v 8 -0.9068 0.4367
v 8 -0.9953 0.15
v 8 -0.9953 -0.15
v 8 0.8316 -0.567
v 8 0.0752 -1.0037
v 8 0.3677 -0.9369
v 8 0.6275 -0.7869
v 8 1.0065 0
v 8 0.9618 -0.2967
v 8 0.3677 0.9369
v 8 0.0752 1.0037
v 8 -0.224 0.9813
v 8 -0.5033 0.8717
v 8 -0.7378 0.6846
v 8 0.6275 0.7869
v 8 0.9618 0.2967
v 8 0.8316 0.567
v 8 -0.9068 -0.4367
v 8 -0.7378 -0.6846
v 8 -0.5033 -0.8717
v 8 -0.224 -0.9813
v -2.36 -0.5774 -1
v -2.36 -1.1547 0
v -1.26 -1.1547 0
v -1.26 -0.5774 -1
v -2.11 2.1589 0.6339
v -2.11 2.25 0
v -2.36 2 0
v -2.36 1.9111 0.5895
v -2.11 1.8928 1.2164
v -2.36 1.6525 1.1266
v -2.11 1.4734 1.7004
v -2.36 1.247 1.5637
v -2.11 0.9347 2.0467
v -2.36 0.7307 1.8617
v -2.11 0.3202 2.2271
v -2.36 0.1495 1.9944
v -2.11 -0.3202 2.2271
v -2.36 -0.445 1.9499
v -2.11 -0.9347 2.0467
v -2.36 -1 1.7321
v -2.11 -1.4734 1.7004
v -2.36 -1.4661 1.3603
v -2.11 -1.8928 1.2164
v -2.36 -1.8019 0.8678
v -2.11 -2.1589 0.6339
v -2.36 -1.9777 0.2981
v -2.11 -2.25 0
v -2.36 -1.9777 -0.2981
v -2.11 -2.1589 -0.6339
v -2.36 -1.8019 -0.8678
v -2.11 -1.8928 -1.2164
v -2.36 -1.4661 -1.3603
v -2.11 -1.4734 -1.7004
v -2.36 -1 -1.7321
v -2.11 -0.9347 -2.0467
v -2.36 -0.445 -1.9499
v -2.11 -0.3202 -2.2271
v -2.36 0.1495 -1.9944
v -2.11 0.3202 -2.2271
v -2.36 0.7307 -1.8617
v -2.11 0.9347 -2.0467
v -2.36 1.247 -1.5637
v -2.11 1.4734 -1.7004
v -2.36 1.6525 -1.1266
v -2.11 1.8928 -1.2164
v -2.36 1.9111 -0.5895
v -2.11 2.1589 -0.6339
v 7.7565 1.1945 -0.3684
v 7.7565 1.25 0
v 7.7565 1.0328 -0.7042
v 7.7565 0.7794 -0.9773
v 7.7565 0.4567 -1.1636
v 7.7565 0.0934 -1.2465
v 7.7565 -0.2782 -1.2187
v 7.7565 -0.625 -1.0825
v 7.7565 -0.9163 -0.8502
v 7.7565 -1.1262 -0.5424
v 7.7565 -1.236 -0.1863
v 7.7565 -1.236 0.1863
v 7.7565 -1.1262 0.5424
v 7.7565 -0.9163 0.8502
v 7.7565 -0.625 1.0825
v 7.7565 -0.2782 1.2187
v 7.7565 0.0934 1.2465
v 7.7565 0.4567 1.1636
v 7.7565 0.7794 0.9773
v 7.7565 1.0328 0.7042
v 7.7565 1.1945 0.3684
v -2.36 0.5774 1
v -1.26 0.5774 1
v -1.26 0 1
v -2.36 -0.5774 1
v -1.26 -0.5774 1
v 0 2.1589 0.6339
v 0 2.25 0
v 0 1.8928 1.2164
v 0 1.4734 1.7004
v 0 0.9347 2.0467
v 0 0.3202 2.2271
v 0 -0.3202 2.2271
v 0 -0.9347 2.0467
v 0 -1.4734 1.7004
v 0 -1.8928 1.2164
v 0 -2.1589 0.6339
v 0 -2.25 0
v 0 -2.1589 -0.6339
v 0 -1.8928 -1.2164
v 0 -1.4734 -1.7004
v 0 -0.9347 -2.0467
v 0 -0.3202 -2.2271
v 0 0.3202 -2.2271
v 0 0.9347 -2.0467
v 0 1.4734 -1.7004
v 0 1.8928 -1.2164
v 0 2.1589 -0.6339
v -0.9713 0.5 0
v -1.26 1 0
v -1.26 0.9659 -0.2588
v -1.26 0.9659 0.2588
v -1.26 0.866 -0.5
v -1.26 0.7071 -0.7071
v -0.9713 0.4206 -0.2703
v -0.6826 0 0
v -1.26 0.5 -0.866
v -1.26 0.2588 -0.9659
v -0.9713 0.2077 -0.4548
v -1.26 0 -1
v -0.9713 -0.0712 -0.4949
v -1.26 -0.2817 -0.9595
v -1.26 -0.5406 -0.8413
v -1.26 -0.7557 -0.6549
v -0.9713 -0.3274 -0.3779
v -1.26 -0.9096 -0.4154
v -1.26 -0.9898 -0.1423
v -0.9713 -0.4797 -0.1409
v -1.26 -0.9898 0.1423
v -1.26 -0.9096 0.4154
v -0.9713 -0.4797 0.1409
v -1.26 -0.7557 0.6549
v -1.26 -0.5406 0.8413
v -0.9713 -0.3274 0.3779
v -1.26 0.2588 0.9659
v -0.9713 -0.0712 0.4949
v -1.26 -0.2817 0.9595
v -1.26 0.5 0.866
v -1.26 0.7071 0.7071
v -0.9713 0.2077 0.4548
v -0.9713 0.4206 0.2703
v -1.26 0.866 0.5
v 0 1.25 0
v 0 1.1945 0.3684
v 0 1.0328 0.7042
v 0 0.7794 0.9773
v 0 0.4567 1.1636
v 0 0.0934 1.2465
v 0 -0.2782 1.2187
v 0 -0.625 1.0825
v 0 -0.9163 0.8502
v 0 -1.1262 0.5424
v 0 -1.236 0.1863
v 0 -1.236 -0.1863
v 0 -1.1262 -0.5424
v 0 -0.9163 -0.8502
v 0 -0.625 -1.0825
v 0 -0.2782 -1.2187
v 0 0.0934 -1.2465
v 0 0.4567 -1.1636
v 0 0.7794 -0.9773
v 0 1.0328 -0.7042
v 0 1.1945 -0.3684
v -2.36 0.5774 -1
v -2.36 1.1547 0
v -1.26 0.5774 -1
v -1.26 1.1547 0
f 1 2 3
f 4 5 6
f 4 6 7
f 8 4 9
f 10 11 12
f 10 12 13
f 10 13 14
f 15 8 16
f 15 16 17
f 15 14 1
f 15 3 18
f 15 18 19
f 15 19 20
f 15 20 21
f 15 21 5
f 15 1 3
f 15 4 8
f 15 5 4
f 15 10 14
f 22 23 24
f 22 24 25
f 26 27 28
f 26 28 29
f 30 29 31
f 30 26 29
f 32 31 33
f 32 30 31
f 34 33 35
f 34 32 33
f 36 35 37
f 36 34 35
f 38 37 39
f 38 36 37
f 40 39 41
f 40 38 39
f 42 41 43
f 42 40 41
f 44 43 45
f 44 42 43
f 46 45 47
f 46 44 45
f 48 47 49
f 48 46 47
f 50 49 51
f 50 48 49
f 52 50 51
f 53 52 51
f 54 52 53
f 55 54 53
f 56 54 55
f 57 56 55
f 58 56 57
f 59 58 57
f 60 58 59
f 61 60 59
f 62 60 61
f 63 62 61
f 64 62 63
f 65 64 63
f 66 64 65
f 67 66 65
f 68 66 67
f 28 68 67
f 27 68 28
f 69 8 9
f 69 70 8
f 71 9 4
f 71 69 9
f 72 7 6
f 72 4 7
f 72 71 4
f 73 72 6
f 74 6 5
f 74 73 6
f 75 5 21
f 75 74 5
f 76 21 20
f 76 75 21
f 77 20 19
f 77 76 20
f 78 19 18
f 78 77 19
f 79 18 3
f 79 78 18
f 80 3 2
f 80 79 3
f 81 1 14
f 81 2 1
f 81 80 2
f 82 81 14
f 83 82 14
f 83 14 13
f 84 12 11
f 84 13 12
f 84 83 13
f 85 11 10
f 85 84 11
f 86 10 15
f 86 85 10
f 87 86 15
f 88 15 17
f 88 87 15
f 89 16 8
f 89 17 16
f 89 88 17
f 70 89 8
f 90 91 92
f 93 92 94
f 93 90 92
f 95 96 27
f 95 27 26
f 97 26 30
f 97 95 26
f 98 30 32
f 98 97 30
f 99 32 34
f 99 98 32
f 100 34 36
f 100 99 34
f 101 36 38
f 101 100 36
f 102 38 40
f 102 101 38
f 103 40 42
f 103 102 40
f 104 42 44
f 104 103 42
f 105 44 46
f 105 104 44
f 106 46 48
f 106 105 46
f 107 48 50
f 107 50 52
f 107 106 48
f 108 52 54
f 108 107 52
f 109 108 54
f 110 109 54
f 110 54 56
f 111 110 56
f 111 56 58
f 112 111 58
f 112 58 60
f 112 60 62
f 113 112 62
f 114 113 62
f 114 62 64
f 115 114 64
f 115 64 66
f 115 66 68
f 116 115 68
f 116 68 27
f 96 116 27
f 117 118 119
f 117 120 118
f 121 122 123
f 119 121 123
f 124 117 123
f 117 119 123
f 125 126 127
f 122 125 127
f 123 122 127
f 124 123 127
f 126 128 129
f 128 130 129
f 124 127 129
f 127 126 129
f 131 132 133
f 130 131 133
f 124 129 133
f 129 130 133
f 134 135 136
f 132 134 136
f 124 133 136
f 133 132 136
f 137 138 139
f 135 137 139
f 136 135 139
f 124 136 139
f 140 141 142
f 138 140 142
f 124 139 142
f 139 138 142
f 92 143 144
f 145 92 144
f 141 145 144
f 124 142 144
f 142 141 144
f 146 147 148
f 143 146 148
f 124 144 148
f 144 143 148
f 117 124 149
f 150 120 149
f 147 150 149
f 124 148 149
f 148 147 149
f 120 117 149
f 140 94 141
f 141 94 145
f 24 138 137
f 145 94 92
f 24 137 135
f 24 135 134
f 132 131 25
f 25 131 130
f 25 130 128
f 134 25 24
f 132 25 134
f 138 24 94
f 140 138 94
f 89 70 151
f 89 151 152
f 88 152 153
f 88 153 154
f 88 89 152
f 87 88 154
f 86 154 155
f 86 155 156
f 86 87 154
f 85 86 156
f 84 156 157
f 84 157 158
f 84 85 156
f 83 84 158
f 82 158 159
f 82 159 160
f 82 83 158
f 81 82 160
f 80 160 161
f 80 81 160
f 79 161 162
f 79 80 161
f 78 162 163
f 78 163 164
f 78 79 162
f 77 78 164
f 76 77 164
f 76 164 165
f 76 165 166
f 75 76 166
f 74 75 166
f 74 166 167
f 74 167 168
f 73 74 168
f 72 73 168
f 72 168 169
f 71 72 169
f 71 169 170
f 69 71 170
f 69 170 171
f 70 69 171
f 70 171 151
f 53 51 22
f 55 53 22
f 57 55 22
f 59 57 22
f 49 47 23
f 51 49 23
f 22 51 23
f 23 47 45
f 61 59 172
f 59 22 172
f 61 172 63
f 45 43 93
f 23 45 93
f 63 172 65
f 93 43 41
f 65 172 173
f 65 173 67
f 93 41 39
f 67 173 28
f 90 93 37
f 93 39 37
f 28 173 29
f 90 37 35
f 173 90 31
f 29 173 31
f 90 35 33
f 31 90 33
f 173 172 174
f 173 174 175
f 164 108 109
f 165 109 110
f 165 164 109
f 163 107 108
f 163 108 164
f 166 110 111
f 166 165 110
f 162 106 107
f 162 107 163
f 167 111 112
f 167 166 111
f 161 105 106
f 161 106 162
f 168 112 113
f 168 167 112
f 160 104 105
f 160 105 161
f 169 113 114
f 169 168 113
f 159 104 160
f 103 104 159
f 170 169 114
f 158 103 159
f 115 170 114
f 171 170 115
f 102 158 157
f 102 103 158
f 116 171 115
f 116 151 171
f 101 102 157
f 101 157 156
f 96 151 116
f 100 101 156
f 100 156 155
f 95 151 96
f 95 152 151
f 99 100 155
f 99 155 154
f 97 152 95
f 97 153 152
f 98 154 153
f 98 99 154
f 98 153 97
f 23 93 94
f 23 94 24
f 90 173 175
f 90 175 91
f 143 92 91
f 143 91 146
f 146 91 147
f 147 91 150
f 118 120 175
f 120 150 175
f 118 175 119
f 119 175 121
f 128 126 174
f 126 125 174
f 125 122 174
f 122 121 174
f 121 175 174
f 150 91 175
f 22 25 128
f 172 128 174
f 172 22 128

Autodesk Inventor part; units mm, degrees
sketch "Sketch_1" plane through (0, 0, 0) normal (0, 0, 1) x (1, 0, 0)
  line L0 (8, 0) -> (-2.36, 0)
  line L1 (-2.36, 0) -> (-2.36, 2)
  line L2 (-2.36, 2) -> (-2.11, 2.25)
  line L3 (-2.11, 2.25) -> (0, 2.25)
  line L4 (0, 2.25) -> (0, 1.25)
  line L5 (0, 1.25) -> (7.7565, 1.25)
  line L6 (7.7565, 1.25) -> (8, 1.0065)
  line L7 (8, 1.0065) -> (8, 0)
  line L8 (8, 0) -> (-2.36, 0)
revolve "Revolution1" add sketch "Sketch_1" angle 360 about axis through (8, 0, 0) along (1, 0, 0)
thread "Thread1" size "M2.5x0.45" class "6g" standard "ISO Metric profile" length 7.2348
sketch "Sketch_2" plane through (-2.36, 0, 0) normal (1, 0, 0) x (0, 0, -1)
  line L0 (-1, -0.5774) -> (0, -1.1547)
  line L1 (0, -1.1547) -> (1, -0.5774)
  line L2 (1, -0.5774) -> (1, 0.5774)
  line L3 (1, 0.5774) -> (0, 1.1547)
  line L4 (0, 1.1547) -> (-1, 0.5774)
  line L5 (-1, 0.5774) -> (-1, -0.5774)
extrude "Extrusion1" cut sketch "Sketch_2" along normal blind 1.1
sketch "Sketch_5" plane through (0, 0, 0) normal (0, 0, 1) x (1, 0, 0)
  line L0 (-0.6826, 0) -> (-1.26, 0)
  line L1 (-1.26, 0) -> (-1.26, 1)
  line L2 (-1.26, 1) -> (-0.6826, 0)
  line L3 (-0.6826, 0) -> (-1.26, 0)
revolve "Revolution2" cut sketch "Sketch_5" angle 360 about axis through (-0.6826, 0, 0) along (1, 0, 0)
ref_plane "SCW_XY" through (0, 0, 0) normal (1, 0, 0) x (0, 0, -1)
ref_plane "SCW_YZ" through (0, 0, 0) normal (0, 0, -1) x (0, 1, 0)
ref_plane "SCW_ZX" through (0, 0, 0) normal (0, 1, 0) x (1, 0, 0)
properties part number "M2.5" material "アルミニウム 6061"
